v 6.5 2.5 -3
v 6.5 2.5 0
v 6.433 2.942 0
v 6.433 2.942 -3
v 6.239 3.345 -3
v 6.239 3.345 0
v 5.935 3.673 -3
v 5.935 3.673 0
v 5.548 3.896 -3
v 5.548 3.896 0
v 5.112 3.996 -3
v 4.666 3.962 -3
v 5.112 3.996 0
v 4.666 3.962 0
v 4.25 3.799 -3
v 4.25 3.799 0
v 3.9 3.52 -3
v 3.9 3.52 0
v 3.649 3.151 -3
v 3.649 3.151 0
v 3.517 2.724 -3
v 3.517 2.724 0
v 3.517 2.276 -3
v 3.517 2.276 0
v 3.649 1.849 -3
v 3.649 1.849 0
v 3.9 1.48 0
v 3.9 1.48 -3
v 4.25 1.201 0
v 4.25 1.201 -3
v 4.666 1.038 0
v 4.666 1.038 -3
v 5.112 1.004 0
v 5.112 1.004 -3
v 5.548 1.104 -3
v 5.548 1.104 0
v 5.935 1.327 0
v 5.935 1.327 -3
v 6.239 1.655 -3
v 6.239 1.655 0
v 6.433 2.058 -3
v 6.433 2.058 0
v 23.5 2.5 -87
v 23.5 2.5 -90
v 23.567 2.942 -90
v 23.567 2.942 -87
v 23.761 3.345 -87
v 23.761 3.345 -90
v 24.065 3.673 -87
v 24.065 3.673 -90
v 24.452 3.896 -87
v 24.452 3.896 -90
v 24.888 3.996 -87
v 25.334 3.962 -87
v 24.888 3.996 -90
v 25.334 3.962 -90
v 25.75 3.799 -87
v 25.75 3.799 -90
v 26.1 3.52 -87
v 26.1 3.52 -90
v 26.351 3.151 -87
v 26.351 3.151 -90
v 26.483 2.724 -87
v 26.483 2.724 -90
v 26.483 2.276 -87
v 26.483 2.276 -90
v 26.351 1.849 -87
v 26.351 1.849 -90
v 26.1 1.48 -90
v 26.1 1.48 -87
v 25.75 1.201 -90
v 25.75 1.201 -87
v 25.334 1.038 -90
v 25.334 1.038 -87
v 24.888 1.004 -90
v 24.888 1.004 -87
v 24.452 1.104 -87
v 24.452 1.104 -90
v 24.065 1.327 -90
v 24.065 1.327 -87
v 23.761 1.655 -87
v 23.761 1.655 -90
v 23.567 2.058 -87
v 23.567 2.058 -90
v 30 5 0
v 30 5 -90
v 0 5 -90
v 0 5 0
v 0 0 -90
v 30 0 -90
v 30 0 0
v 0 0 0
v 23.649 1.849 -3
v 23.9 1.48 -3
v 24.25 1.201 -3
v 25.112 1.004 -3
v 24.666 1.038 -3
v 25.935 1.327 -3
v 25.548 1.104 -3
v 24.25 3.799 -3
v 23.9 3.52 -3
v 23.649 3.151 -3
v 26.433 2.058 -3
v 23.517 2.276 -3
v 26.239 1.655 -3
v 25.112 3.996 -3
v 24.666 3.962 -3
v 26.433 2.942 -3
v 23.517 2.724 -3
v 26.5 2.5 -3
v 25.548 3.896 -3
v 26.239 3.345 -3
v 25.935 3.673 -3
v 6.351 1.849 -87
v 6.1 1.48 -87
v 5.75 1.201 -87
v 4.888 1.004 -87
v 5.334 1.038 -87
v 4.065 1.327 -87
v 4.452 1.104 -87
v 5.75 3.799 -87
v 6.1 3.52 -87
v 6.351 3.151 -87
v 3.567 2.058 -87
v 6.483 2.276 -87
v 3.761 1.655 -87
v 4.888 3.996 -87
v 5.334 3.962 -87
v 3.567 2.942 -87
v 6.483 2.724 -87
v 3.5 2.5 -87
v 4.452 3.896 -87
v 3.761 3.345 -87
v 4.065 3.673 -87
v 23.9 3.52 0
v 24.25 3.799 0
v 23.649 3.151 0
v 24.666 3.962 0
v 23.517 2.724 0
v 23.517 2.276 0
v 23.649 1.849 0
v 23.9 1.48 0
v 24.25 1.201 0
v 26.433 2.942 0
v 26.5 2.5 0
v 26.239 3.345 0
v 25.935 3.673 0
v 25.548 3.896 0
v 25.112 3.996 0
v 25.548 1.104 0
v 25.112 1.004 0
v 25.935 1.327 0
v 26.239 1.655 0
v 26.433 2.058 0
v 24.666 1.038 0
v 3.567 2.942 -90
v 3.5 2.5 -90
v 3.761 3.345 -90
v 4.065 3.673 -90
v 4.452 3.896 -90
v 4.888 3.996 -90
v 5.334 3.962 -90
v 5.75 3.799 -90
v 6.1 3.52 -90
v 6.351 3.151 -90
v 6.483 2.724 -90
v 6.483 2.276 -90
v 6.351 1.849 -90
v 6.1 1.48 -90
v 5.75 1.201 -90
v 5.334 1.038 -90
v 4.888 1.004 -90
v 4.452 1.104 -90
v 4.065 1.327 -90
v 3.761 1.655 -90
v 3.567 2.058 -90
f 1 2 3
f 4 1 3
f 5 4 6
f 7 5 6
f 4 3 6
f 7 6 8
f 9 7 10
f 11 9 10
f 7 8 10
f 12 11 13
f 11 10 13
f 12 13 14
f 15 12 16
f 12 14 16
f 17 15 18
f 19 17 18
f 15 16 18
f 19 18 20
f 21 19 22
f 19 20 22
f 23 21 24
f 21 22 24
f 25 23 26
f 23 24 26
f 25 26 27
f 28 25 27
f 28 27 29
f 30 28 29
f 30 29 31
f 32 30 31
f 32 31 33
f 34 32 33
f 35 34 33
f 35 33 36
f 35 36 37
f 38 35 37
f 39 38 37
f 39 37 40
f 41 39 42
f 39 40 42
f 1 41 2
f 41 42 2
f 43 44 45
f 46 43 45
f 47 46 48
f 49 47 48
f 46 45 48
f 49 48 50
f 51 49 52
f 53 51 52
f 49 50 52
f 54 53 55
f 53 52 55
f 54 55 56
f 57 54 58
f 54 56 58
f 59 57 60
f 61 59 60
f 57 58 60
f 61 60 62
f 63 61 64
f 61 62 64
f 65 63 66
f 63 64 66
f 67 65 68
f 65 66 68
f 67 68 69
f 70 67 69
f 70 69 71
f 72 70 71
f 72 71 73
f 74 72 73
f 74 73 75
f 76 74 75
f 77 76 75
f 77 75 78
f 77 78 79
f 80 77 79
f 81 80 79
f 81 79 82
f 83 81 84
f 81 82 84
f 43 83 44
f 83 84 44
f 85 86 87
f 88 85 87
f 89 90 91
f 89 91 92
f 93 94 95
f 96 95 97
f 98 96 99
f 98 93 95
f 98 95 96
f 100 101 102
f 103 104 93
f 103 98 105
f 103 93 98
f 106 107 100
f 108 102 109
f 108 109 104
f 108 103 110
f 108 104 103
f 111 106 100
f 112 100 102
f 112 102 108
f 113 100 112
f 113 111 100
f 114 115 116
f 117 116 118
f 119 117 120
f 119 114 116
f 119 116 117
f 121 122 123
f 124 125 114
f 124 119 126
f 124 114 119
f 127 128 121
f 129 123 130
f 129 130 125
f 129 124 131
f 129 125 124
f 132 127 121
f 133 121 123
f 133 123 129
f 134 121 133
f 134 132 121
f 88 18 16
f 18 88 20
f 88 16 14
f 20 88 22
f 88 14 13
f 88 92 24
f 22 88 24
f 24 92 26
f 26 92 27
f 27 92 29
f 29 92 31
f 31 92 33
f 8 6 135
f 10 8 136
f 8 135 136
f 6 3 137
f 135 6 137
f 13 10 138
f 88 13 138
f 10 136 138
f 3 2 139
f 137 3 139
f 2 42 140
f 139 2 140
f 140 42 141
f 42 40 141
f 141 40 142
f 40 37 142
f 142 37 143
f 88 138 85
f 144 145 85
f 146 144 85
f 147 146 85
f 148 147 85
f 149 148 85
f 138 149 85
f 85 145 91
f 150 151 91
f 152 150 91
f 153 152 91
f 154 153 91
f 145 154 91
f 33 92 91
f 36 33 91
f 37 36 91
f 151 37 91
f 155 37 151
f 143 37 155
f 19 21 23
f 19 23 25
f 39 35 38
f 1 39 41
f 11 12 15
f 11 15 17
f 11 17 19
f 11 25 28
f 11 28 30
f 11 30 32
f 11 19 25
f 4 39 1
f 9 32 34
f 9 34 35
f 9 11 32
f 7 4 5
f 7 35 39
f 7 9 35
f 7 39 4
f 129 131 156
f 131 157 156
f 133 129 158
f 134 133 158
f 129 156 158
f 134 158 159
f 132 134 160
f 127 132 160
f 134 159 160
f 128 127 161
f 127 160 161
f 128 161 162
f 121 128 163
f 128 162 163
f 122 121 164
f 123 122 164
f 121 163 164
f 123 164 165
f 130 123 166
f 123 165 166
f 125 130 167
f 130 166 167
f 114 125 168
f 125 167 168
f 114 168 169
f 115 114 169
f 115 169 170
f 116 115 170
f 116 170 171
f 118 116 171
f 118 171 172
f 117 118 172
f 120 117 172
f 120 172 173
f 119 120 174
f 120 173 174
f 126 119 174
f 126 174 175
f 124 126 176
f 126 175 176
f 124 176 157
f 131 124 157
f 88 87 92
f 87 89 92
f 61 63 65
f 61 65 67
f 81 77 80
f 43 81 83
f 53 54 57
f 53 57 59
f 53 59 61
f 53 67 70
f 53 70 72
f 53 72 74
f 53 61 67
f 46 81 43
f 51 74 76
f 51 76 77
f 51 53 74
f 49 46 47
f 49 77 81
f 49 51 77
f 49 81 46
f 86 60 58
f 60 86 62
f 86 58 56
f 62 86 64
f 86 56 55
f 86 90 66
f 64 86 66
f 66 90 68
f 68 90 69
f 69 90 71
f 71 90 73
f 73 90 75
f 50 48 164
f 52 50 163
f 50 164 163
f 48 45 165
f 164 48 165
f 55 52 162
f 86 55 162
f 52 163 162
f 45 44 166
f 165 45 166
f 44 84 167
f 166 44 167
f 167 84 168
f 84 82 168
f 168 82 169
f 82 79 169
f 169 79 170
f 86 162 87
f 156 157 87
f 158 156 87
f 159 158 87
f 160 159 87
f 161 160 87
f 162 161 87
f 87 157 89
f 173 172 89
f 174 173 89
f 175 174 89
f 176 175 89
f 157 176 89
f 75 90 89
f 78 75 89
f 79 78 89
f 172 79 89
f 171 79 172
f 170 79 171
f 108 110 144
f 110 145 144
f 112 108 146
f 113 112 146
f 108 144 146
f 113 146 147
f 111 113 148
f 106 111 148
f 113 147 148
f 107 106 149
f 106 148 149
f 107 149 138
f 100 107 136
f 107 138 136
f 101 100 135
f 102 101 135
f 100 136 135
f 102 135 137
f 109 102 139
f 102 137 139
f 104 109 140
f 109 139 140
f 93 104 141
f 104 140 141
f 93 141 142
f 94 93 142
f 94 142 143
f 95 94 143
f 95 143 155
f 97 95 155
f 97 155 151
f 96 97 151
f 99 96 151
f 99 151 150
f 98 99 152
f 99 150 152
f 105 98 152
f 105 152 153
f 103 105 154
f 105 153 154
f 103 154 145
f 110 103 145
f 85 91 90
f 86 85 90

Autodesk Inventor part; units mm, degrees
ref_plane "YZ Plane" through (0, 0, 0) normal (1, 0, 0) x (0, 1, 0)
ref_plane "XZ Plane" through (0, 0, 0) normal (0, 1, 0) x (-1, 0, 0)
ref_plane "XY Plane" through (0, 0, 0) normal (0, 0, 1) x (1, 0, 0)
sketch "Boceto1" plane through (0, 0, 0) normal (0, 1, 0) x (-1, 0, 0)
  point P0 (0, 0)
sketch "Boceto2" plane through (0, 0, 0) normal (0, 1, 0) x (-1, 0, 0)
  line L0 (0, 0) -> (-30, 0)
  line L1 (-30, 0) -> (-30, -90)
  line L2 (-30, -90) -> (0, -90)
  line L3 (0, -90) -> (0, 0)
  dimension "d0" = 30
  dimension "d1" = 90
extrude "Extrusión1" add sketch "Boceto2" along normal blind 5
sketch "Boceto3" plane through (0, 0, 0) normal (0, 0, 1) x (1, 0, 0)
  circle A0 centre (25, 2.5) radius 1.5
  circle A1 centre (5, 2.5) radius 1.5
  line L0 (0, 0) -> (0, 5) projected
  line L1 (30, 0) -> (30, 5) projected
  line L2 (0, 0) -> (30, 0) projected
  dimension "d4" = 3
  dimension "d5" = 3
  dimension "d6" = 5
  dimension "d7" = 5
  dimension "d8" = 2.5
  dimension "d9" = 2.5
extrude "Extrusión2" cut sketch "Boceto3" against normal blind 3
sketch "Boceto4" plane through (30, 0, -90) normal (0, 0, -1) x (-1, 0, 0)
  circle A0 centre (5, 2.5) radius 1.5 projected
  circle A1 centre (5, 2.5) radius 1.5
  circle A2 centre (25, 2.5) radius 1.5 projected
  circle A3 centre (25, 2.5) radius 1.5
  point P0 (30, 0)
extrude "Extrusión3" cut sketch "Boceto4" against normal blind 3
properties part number "Interno"
